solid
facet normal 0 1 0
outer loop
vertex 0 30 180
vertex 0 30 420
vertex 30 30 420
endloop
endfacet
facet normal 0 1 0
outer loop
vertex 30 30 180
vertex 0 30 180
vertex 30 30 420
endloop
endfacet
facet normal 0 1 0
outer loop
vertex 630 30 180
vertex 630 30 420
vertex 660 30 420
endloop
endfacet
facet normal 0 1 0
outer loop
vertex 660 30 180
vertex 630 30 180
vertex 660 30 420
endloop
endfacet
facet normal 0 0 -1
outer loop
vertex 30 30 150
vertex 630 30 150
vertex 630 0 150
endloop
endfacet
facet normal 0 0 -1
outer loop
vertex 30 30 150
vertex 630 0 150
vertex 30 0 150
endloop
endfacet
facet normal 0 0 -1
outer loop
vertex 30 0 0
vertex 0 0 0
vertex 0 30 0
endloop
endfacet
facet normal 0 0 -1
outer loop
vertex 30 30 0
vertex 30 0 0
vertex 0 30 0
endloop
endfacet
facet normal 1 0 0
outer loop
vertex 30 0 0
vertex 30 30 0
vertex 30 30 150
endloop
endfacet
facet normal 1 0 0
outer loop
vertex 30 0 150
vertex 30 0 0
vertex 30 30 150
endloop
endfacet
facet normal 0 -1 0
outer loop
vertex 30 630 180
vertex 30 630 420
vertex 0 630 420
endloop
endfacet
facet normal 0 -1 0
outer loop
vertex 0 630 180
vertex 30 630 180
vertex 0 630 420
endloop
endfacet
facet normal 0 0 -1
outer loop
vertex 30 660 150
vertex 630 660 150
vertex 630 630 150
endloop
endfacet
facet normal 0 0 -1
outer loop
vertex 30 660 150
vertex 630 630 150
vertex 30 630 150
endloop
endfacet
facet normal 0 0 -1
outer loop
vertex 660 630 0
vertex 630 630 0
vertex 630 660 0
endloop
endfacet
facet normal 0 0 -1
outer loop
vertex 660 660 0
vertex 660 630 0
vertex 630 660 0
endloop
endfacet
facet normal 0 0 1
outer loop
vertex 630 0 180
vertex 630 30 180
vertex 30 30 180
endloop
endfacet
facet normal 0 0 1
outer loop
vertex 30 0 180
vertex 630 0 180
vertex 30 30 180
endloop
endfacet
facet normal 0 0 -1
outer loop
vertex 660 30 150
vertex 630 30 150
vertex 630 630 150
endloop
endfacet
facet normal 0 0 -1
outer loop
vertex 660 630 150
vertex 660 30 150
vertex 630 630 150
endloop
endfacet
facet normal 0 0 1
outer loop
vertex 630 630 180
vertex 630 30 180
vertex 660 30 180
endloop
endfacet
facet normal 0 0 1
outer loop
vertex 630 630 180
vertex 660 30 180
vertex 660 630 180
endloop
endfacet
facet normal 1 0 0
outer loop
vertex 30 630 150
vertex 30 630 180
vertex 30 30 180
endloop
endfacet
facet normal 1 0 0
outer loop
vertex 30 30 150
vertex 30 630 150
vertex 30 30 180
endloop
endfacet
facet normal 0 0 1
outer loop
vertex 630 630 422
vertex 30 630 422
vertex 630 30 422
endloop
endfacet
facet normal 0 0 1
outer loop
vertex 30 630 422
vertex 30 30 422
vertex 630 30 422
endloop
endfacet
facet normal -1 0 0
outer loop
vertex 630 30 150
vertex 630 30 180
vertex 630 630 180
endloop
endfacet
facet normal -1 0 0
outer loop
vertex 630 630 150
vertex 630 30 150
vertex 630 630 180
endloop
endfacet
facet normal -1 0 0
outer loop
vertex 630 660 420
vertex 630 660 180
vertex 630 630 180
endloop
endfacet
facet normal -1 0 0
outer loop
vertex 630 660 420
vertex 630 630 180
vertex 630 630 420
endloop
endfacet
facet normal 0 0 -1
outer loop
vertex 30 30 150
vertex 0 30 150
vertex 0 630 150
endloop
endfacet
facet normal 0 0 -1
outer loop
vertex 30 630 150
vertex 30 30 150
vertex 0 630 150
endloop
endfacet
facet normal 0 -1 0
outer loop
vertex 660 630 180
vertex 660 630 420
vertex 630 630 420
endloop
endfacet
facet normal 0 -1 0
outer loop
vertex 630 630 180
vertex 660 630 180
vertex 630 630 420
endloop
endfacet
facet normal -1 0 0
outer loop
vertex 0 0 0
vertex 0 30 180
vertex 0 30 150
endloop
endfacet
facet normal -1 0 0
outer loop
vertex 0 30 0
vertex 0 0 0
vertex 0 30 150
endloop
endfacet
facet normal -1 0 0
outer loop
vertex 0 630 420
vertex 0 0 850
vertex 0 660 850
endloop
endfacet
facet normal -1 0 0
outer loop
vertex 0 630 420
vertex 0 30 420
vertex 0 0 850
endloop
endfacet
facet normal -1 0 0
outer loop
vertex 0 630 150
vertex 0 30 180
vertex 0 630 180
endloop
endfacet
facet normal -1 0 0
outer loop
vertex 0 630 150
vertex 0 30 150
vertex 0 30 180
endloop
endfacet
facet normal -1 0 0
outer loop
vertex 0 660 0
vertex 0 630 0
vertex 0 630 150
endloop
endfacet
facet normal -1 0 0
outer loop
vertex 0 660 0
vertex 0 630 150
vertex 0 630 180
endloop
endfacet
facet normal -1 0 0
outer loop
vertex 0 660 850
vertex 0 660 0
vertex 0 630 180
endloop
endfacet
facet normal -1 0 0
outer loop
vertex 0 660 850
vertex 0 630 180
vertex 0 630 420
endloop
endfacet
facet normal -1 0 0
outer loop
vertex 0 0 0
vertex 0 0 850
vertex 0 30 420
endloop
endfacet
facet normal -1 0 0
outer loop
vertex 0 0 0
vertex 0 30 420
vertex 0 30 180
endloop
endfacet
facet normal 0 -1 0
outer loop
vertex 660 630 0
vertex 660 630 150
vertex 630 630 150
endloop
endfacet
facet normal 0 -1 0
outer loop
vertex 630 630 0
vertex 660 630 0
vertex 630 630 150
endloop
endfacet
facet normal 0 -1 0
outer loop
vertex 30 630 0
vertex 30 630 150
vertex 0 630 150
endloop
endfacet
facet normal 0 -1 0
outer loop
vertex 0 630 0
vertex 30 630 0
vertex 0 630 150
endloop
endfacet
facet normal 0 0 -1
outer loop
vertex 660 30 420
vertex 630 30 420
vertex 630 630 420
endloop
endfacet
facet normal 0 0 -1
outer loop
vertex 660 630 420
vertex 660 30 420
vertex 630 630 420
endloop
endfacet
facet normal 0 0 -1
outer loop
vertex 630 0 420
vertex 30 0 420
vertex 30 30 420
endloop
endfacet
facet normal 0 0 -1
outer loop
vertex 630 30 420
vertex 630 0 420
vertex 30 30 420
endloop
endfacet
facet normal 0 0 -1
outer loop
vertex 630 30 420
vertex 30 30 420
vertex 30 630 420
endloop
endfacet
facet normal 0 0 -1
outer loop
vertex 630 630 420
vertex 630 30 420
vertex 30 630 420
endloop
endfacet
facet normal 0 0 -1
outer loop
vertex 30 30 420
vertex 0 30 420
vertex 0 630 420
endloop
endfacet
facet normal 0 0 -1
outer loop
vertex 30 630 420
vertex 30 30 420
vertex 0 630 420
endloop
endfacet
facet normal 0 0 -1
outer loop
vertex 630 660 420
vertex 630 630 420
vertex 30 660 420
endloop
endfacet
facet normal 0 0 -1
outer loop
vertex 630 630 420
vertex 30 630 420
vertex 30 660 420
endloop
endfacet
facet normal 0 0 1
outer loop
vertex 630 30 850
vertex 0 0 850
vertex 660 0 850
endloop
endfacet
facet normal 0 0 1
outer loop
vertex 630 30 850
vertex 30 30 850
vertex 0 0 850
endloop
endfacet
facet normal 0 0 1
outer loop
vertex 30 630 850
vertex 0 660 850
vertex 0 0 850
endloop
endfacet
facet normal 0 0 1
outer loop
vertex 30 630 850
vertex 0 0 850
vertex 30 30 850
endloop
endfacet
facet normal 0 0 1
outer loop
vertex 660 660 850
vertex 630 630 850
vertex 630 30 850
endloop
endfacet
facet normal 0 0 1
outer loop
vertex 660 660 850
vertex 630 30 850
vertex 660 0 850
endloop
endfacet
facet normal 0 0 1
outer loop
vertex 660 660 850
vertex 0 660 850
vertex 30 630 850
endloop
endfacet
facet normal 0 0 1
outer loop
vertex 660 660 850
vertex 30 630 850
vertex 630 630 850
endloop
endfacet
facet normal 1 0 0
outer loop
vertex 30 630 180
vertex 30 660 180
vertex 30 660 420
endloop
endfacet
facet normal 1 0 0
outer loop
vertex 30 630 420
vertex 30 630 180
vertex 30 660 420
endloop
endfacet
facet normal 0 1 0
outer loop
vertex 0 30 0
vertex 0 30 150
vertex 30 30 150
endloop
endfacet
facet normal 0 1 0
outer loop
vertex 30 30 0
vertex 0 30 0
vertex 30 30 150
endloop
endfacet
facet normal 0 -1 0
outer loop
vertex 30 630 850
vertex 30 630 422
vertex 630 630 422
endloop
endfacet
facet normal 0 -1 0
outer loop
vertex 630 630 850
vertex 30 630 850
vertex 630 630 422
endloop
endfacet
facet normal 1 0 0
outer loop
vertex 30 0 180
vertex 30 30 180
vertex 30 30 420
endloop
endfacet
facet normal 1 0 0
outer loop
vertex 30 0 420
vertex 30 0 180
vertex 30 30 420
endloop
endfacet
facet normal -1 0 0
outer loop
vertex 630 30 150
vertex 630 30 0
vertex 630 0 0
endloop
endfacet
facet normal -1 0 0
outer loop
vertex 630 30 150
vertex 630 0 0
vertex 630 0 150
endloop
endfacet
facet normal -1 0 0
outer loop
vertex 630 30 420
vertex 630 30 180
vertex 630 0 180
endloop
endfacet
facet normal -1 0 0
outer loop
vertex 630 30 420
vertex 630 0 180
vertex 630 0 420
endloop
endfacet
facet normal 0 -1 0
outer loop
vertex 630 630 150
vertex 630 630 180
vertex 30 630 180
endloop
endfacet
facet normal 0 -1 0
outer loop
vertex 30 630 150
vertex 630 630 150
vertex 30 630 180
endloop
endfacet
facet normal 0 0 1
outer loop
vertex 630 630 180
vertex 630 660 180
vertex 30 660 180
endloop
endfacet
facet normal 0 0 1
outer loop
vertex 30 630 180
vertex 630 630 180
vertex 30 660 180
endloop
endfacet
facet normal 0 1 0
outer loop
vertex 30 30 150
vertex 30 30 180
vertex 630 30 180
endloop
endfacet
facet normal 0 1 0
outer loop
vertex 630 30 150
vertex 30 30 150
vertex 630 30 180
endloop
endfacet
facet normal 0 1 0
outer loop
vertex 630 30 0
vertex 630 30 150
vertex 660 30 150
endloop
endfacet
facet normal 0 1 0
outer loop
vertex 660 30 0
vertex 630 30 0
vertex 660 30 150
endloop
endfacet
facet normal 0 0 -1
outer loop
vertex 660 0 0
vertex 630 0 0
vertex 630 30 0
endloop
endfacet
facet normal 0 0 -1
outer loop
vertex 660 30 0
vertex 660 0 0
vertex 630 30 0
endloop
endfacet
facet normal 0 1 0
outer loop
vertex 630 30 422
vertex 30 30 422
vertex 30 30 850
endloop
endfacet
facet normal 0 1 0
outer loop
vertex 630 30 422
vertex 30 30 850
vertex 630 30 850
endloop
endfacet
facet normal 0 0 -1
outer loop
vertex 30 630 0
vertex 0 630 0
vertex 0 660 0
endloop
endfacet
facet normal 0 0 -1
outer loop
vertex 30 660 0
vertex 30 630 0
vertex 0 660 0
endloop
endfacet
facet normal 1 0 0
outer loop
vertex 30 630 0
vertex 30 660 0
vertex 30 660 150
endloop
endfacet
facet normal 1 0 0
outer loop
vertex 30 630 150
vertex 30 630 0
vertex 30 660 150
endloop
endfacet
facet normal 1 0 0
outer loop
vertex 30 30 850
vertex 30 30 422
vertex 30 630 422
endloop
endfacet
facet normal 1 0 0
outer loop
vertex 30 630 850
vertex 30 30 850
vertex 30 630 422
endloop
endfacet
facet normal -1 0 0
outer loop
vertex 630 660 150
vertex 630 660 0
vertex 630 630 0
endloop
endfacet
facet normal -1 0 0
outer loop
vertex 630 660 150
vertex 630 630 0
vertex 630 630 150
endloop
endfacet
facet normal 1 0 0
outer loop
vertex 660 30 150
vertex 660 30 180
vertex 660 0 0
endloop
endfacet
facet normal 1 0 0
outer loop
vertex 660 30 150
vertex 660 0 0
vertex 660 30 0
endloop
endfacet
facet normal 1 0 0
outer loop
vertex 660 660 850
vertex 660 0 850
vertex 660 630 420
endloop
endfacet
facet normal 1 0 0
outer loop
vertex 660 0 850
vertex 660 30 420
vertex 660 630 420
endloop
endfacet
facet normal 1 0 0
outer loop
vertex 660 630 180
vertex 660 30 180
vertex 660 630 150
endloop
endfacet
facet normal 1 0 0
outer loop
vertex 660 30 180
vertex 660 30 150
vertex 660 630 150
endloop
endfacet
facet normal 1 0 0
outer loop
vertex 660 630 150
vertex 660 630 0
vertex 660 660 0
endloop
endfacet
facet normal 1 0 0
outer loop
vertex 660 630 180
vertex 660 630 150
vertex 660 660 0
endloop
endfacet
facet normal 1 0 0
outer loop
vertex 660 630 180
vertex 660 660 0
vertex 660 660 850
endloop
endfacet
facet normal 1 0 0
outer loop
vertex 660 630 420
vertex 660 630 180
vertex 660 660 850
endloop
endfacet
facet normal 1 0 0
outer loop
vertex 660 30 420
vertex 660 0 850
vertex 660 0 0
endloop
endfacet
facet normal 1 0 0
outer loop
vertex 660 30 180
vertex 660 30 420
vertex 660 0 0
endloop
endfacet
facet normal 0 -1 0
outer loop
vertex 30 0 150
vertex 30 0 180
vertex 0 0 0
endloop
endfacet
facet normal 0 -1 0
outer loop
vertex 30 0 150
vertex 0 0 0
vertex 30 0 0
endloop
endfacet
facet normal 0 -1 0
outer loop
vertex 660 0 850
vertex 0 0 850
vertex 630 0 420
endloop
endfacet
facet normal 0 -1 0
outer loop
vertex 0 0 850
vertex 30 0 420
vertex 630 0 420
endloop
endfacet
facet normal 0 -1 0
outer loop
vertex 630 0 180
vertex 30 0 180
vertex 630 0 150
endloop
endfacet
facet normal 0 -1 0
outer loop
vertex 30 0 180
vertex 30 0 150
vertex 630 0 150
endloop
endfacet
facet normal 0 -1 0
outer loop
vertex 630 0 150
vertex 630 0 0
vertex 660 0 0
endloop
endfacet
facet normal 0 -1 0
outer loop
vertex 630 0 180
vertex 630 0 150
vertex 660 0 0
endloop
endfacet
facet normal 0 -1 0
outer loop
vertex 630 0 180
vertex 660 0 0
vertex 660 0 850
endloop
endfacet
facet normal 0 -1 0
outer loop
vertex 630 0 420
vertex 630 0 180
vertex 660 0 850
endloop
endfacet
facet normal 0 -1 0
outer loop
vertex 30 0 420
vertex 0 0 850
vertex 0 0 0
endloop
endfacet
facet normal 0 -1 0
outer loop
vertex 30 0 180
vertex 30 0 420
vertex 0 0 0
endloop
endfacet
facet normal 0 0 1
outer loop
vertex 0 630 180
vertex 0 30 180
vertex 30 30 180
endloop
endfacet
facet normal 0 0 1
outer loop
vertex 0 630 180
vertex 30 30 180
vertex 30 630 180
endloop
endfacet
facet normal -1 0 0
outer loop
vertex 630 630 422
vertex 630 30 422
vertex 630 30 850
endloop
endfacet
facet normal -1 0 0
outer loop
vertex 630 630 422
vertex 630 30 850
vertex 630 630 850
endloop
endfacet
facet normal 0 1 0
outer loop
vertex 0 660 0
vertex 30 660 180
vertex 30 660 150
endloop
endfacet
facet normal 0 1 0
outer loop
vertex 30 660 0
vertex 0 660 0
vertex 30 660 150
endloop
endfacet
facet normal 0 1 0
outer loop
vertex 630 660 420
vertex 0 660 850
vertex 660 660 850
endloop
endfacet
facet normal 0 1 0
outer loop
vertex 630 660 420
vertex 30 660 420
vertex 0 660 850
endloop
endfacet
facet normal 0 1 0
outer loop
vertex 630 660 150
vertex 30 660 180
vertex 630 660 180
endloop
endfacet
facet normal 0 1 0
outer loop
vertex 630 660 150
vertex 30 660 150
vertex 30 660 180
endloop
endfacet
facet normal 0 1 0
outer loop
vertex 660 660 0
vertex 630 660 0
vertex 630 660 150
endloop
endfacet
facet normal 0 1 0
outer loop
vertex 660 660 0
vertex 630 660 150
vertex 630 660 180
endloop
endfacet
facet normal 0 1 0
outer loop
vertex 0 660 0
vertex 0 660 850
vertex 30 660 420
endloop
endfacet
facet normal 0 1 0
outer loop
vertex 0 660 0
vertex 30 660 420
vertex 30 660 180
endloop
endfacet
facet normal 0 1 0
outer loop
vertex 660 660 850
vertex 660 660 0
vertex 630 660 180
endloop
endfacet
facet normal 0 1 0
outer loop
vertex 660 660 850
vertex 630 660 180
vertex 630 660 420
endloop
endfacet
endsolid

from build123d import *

# Parameters (mm, degrees)
F0_W     = 600
F0_H     = 240
F1_DEPTH = 660
F3_DEPTH = 450.001
F4_W     = 600
F4_H     = 150
F4_H_2   = 240
F5_DEPTH = 660.001
F6_W     = 660
F6_H     = 660
F6_W_2   = 600
F6_H_2   = 600
F7_DEPTH = 400
F8_W     = 630
F8_H     = 660
F9_DEPTH = 2


with BuildPart() as f1:
    # F0 (on Right) → F1 (new body)
    with BuildSketch(Plane.YZ):
        Polygon((0, 450), (0, 0), (30, 0), (30, 150), (630, 150), (630, 0), (660, 0), (660, 450), align=None)
        with Locations((330, 300)):
            Rectangle(F0_W, F0_H, mode=Mode.SUBTRACT)
    extrude(amount=F1_DEPTH)

    # F2 (on face) → F3 (cut, through all)
    with BuildSketch(Plane.XY.offset(450)):
        Polygon((30, 30), (630, 30), (630, 630), (385, 630), (30, 630), align=None)
    extrude(amount=-F3_DEPTH, mode=Mode.SUBTRACT)

    # F4 (on face) → F5 (cut, through all)
    with BuildSketch(Plane(origin=(0, 660, 0), x_dir=(-1, 0, 0), z_dir=(0, 1, 0))):
        with Locations((-330, 75)):
            Rectangle(F4_W, F4_H)
        with Locations((-330, 300)):
            Rectangle(F4_W, F4_H_2)
    extrude(amount=-F5_DEPTH, mode=Mode.SUBTRACT)

    # F6 (on face) → F7 (join)
    with BuildSketch(Plane.XY.offset(450)):
        with Locations((330, 330)):
            Rectangle(F6_W, F6_H)
        with Locations((330, 330)):
            Rectangle(F6_W_2, F6_H_2, mode=Mode.SUBTRACT)
    extrude(amount=F7_DEPTH)

    # F8 (on face) → F9 (join)
    with BuildSketch(Plane(origin=(0, 0, 420), x_dir=(1, 0, 0), z_dir=(0, 0, -1))):
        with Locations((315, -330)):
            Rectangle(F8_W, F8_H)
    extrude(amount=-F9_DEPTH)


solid = f1.part
